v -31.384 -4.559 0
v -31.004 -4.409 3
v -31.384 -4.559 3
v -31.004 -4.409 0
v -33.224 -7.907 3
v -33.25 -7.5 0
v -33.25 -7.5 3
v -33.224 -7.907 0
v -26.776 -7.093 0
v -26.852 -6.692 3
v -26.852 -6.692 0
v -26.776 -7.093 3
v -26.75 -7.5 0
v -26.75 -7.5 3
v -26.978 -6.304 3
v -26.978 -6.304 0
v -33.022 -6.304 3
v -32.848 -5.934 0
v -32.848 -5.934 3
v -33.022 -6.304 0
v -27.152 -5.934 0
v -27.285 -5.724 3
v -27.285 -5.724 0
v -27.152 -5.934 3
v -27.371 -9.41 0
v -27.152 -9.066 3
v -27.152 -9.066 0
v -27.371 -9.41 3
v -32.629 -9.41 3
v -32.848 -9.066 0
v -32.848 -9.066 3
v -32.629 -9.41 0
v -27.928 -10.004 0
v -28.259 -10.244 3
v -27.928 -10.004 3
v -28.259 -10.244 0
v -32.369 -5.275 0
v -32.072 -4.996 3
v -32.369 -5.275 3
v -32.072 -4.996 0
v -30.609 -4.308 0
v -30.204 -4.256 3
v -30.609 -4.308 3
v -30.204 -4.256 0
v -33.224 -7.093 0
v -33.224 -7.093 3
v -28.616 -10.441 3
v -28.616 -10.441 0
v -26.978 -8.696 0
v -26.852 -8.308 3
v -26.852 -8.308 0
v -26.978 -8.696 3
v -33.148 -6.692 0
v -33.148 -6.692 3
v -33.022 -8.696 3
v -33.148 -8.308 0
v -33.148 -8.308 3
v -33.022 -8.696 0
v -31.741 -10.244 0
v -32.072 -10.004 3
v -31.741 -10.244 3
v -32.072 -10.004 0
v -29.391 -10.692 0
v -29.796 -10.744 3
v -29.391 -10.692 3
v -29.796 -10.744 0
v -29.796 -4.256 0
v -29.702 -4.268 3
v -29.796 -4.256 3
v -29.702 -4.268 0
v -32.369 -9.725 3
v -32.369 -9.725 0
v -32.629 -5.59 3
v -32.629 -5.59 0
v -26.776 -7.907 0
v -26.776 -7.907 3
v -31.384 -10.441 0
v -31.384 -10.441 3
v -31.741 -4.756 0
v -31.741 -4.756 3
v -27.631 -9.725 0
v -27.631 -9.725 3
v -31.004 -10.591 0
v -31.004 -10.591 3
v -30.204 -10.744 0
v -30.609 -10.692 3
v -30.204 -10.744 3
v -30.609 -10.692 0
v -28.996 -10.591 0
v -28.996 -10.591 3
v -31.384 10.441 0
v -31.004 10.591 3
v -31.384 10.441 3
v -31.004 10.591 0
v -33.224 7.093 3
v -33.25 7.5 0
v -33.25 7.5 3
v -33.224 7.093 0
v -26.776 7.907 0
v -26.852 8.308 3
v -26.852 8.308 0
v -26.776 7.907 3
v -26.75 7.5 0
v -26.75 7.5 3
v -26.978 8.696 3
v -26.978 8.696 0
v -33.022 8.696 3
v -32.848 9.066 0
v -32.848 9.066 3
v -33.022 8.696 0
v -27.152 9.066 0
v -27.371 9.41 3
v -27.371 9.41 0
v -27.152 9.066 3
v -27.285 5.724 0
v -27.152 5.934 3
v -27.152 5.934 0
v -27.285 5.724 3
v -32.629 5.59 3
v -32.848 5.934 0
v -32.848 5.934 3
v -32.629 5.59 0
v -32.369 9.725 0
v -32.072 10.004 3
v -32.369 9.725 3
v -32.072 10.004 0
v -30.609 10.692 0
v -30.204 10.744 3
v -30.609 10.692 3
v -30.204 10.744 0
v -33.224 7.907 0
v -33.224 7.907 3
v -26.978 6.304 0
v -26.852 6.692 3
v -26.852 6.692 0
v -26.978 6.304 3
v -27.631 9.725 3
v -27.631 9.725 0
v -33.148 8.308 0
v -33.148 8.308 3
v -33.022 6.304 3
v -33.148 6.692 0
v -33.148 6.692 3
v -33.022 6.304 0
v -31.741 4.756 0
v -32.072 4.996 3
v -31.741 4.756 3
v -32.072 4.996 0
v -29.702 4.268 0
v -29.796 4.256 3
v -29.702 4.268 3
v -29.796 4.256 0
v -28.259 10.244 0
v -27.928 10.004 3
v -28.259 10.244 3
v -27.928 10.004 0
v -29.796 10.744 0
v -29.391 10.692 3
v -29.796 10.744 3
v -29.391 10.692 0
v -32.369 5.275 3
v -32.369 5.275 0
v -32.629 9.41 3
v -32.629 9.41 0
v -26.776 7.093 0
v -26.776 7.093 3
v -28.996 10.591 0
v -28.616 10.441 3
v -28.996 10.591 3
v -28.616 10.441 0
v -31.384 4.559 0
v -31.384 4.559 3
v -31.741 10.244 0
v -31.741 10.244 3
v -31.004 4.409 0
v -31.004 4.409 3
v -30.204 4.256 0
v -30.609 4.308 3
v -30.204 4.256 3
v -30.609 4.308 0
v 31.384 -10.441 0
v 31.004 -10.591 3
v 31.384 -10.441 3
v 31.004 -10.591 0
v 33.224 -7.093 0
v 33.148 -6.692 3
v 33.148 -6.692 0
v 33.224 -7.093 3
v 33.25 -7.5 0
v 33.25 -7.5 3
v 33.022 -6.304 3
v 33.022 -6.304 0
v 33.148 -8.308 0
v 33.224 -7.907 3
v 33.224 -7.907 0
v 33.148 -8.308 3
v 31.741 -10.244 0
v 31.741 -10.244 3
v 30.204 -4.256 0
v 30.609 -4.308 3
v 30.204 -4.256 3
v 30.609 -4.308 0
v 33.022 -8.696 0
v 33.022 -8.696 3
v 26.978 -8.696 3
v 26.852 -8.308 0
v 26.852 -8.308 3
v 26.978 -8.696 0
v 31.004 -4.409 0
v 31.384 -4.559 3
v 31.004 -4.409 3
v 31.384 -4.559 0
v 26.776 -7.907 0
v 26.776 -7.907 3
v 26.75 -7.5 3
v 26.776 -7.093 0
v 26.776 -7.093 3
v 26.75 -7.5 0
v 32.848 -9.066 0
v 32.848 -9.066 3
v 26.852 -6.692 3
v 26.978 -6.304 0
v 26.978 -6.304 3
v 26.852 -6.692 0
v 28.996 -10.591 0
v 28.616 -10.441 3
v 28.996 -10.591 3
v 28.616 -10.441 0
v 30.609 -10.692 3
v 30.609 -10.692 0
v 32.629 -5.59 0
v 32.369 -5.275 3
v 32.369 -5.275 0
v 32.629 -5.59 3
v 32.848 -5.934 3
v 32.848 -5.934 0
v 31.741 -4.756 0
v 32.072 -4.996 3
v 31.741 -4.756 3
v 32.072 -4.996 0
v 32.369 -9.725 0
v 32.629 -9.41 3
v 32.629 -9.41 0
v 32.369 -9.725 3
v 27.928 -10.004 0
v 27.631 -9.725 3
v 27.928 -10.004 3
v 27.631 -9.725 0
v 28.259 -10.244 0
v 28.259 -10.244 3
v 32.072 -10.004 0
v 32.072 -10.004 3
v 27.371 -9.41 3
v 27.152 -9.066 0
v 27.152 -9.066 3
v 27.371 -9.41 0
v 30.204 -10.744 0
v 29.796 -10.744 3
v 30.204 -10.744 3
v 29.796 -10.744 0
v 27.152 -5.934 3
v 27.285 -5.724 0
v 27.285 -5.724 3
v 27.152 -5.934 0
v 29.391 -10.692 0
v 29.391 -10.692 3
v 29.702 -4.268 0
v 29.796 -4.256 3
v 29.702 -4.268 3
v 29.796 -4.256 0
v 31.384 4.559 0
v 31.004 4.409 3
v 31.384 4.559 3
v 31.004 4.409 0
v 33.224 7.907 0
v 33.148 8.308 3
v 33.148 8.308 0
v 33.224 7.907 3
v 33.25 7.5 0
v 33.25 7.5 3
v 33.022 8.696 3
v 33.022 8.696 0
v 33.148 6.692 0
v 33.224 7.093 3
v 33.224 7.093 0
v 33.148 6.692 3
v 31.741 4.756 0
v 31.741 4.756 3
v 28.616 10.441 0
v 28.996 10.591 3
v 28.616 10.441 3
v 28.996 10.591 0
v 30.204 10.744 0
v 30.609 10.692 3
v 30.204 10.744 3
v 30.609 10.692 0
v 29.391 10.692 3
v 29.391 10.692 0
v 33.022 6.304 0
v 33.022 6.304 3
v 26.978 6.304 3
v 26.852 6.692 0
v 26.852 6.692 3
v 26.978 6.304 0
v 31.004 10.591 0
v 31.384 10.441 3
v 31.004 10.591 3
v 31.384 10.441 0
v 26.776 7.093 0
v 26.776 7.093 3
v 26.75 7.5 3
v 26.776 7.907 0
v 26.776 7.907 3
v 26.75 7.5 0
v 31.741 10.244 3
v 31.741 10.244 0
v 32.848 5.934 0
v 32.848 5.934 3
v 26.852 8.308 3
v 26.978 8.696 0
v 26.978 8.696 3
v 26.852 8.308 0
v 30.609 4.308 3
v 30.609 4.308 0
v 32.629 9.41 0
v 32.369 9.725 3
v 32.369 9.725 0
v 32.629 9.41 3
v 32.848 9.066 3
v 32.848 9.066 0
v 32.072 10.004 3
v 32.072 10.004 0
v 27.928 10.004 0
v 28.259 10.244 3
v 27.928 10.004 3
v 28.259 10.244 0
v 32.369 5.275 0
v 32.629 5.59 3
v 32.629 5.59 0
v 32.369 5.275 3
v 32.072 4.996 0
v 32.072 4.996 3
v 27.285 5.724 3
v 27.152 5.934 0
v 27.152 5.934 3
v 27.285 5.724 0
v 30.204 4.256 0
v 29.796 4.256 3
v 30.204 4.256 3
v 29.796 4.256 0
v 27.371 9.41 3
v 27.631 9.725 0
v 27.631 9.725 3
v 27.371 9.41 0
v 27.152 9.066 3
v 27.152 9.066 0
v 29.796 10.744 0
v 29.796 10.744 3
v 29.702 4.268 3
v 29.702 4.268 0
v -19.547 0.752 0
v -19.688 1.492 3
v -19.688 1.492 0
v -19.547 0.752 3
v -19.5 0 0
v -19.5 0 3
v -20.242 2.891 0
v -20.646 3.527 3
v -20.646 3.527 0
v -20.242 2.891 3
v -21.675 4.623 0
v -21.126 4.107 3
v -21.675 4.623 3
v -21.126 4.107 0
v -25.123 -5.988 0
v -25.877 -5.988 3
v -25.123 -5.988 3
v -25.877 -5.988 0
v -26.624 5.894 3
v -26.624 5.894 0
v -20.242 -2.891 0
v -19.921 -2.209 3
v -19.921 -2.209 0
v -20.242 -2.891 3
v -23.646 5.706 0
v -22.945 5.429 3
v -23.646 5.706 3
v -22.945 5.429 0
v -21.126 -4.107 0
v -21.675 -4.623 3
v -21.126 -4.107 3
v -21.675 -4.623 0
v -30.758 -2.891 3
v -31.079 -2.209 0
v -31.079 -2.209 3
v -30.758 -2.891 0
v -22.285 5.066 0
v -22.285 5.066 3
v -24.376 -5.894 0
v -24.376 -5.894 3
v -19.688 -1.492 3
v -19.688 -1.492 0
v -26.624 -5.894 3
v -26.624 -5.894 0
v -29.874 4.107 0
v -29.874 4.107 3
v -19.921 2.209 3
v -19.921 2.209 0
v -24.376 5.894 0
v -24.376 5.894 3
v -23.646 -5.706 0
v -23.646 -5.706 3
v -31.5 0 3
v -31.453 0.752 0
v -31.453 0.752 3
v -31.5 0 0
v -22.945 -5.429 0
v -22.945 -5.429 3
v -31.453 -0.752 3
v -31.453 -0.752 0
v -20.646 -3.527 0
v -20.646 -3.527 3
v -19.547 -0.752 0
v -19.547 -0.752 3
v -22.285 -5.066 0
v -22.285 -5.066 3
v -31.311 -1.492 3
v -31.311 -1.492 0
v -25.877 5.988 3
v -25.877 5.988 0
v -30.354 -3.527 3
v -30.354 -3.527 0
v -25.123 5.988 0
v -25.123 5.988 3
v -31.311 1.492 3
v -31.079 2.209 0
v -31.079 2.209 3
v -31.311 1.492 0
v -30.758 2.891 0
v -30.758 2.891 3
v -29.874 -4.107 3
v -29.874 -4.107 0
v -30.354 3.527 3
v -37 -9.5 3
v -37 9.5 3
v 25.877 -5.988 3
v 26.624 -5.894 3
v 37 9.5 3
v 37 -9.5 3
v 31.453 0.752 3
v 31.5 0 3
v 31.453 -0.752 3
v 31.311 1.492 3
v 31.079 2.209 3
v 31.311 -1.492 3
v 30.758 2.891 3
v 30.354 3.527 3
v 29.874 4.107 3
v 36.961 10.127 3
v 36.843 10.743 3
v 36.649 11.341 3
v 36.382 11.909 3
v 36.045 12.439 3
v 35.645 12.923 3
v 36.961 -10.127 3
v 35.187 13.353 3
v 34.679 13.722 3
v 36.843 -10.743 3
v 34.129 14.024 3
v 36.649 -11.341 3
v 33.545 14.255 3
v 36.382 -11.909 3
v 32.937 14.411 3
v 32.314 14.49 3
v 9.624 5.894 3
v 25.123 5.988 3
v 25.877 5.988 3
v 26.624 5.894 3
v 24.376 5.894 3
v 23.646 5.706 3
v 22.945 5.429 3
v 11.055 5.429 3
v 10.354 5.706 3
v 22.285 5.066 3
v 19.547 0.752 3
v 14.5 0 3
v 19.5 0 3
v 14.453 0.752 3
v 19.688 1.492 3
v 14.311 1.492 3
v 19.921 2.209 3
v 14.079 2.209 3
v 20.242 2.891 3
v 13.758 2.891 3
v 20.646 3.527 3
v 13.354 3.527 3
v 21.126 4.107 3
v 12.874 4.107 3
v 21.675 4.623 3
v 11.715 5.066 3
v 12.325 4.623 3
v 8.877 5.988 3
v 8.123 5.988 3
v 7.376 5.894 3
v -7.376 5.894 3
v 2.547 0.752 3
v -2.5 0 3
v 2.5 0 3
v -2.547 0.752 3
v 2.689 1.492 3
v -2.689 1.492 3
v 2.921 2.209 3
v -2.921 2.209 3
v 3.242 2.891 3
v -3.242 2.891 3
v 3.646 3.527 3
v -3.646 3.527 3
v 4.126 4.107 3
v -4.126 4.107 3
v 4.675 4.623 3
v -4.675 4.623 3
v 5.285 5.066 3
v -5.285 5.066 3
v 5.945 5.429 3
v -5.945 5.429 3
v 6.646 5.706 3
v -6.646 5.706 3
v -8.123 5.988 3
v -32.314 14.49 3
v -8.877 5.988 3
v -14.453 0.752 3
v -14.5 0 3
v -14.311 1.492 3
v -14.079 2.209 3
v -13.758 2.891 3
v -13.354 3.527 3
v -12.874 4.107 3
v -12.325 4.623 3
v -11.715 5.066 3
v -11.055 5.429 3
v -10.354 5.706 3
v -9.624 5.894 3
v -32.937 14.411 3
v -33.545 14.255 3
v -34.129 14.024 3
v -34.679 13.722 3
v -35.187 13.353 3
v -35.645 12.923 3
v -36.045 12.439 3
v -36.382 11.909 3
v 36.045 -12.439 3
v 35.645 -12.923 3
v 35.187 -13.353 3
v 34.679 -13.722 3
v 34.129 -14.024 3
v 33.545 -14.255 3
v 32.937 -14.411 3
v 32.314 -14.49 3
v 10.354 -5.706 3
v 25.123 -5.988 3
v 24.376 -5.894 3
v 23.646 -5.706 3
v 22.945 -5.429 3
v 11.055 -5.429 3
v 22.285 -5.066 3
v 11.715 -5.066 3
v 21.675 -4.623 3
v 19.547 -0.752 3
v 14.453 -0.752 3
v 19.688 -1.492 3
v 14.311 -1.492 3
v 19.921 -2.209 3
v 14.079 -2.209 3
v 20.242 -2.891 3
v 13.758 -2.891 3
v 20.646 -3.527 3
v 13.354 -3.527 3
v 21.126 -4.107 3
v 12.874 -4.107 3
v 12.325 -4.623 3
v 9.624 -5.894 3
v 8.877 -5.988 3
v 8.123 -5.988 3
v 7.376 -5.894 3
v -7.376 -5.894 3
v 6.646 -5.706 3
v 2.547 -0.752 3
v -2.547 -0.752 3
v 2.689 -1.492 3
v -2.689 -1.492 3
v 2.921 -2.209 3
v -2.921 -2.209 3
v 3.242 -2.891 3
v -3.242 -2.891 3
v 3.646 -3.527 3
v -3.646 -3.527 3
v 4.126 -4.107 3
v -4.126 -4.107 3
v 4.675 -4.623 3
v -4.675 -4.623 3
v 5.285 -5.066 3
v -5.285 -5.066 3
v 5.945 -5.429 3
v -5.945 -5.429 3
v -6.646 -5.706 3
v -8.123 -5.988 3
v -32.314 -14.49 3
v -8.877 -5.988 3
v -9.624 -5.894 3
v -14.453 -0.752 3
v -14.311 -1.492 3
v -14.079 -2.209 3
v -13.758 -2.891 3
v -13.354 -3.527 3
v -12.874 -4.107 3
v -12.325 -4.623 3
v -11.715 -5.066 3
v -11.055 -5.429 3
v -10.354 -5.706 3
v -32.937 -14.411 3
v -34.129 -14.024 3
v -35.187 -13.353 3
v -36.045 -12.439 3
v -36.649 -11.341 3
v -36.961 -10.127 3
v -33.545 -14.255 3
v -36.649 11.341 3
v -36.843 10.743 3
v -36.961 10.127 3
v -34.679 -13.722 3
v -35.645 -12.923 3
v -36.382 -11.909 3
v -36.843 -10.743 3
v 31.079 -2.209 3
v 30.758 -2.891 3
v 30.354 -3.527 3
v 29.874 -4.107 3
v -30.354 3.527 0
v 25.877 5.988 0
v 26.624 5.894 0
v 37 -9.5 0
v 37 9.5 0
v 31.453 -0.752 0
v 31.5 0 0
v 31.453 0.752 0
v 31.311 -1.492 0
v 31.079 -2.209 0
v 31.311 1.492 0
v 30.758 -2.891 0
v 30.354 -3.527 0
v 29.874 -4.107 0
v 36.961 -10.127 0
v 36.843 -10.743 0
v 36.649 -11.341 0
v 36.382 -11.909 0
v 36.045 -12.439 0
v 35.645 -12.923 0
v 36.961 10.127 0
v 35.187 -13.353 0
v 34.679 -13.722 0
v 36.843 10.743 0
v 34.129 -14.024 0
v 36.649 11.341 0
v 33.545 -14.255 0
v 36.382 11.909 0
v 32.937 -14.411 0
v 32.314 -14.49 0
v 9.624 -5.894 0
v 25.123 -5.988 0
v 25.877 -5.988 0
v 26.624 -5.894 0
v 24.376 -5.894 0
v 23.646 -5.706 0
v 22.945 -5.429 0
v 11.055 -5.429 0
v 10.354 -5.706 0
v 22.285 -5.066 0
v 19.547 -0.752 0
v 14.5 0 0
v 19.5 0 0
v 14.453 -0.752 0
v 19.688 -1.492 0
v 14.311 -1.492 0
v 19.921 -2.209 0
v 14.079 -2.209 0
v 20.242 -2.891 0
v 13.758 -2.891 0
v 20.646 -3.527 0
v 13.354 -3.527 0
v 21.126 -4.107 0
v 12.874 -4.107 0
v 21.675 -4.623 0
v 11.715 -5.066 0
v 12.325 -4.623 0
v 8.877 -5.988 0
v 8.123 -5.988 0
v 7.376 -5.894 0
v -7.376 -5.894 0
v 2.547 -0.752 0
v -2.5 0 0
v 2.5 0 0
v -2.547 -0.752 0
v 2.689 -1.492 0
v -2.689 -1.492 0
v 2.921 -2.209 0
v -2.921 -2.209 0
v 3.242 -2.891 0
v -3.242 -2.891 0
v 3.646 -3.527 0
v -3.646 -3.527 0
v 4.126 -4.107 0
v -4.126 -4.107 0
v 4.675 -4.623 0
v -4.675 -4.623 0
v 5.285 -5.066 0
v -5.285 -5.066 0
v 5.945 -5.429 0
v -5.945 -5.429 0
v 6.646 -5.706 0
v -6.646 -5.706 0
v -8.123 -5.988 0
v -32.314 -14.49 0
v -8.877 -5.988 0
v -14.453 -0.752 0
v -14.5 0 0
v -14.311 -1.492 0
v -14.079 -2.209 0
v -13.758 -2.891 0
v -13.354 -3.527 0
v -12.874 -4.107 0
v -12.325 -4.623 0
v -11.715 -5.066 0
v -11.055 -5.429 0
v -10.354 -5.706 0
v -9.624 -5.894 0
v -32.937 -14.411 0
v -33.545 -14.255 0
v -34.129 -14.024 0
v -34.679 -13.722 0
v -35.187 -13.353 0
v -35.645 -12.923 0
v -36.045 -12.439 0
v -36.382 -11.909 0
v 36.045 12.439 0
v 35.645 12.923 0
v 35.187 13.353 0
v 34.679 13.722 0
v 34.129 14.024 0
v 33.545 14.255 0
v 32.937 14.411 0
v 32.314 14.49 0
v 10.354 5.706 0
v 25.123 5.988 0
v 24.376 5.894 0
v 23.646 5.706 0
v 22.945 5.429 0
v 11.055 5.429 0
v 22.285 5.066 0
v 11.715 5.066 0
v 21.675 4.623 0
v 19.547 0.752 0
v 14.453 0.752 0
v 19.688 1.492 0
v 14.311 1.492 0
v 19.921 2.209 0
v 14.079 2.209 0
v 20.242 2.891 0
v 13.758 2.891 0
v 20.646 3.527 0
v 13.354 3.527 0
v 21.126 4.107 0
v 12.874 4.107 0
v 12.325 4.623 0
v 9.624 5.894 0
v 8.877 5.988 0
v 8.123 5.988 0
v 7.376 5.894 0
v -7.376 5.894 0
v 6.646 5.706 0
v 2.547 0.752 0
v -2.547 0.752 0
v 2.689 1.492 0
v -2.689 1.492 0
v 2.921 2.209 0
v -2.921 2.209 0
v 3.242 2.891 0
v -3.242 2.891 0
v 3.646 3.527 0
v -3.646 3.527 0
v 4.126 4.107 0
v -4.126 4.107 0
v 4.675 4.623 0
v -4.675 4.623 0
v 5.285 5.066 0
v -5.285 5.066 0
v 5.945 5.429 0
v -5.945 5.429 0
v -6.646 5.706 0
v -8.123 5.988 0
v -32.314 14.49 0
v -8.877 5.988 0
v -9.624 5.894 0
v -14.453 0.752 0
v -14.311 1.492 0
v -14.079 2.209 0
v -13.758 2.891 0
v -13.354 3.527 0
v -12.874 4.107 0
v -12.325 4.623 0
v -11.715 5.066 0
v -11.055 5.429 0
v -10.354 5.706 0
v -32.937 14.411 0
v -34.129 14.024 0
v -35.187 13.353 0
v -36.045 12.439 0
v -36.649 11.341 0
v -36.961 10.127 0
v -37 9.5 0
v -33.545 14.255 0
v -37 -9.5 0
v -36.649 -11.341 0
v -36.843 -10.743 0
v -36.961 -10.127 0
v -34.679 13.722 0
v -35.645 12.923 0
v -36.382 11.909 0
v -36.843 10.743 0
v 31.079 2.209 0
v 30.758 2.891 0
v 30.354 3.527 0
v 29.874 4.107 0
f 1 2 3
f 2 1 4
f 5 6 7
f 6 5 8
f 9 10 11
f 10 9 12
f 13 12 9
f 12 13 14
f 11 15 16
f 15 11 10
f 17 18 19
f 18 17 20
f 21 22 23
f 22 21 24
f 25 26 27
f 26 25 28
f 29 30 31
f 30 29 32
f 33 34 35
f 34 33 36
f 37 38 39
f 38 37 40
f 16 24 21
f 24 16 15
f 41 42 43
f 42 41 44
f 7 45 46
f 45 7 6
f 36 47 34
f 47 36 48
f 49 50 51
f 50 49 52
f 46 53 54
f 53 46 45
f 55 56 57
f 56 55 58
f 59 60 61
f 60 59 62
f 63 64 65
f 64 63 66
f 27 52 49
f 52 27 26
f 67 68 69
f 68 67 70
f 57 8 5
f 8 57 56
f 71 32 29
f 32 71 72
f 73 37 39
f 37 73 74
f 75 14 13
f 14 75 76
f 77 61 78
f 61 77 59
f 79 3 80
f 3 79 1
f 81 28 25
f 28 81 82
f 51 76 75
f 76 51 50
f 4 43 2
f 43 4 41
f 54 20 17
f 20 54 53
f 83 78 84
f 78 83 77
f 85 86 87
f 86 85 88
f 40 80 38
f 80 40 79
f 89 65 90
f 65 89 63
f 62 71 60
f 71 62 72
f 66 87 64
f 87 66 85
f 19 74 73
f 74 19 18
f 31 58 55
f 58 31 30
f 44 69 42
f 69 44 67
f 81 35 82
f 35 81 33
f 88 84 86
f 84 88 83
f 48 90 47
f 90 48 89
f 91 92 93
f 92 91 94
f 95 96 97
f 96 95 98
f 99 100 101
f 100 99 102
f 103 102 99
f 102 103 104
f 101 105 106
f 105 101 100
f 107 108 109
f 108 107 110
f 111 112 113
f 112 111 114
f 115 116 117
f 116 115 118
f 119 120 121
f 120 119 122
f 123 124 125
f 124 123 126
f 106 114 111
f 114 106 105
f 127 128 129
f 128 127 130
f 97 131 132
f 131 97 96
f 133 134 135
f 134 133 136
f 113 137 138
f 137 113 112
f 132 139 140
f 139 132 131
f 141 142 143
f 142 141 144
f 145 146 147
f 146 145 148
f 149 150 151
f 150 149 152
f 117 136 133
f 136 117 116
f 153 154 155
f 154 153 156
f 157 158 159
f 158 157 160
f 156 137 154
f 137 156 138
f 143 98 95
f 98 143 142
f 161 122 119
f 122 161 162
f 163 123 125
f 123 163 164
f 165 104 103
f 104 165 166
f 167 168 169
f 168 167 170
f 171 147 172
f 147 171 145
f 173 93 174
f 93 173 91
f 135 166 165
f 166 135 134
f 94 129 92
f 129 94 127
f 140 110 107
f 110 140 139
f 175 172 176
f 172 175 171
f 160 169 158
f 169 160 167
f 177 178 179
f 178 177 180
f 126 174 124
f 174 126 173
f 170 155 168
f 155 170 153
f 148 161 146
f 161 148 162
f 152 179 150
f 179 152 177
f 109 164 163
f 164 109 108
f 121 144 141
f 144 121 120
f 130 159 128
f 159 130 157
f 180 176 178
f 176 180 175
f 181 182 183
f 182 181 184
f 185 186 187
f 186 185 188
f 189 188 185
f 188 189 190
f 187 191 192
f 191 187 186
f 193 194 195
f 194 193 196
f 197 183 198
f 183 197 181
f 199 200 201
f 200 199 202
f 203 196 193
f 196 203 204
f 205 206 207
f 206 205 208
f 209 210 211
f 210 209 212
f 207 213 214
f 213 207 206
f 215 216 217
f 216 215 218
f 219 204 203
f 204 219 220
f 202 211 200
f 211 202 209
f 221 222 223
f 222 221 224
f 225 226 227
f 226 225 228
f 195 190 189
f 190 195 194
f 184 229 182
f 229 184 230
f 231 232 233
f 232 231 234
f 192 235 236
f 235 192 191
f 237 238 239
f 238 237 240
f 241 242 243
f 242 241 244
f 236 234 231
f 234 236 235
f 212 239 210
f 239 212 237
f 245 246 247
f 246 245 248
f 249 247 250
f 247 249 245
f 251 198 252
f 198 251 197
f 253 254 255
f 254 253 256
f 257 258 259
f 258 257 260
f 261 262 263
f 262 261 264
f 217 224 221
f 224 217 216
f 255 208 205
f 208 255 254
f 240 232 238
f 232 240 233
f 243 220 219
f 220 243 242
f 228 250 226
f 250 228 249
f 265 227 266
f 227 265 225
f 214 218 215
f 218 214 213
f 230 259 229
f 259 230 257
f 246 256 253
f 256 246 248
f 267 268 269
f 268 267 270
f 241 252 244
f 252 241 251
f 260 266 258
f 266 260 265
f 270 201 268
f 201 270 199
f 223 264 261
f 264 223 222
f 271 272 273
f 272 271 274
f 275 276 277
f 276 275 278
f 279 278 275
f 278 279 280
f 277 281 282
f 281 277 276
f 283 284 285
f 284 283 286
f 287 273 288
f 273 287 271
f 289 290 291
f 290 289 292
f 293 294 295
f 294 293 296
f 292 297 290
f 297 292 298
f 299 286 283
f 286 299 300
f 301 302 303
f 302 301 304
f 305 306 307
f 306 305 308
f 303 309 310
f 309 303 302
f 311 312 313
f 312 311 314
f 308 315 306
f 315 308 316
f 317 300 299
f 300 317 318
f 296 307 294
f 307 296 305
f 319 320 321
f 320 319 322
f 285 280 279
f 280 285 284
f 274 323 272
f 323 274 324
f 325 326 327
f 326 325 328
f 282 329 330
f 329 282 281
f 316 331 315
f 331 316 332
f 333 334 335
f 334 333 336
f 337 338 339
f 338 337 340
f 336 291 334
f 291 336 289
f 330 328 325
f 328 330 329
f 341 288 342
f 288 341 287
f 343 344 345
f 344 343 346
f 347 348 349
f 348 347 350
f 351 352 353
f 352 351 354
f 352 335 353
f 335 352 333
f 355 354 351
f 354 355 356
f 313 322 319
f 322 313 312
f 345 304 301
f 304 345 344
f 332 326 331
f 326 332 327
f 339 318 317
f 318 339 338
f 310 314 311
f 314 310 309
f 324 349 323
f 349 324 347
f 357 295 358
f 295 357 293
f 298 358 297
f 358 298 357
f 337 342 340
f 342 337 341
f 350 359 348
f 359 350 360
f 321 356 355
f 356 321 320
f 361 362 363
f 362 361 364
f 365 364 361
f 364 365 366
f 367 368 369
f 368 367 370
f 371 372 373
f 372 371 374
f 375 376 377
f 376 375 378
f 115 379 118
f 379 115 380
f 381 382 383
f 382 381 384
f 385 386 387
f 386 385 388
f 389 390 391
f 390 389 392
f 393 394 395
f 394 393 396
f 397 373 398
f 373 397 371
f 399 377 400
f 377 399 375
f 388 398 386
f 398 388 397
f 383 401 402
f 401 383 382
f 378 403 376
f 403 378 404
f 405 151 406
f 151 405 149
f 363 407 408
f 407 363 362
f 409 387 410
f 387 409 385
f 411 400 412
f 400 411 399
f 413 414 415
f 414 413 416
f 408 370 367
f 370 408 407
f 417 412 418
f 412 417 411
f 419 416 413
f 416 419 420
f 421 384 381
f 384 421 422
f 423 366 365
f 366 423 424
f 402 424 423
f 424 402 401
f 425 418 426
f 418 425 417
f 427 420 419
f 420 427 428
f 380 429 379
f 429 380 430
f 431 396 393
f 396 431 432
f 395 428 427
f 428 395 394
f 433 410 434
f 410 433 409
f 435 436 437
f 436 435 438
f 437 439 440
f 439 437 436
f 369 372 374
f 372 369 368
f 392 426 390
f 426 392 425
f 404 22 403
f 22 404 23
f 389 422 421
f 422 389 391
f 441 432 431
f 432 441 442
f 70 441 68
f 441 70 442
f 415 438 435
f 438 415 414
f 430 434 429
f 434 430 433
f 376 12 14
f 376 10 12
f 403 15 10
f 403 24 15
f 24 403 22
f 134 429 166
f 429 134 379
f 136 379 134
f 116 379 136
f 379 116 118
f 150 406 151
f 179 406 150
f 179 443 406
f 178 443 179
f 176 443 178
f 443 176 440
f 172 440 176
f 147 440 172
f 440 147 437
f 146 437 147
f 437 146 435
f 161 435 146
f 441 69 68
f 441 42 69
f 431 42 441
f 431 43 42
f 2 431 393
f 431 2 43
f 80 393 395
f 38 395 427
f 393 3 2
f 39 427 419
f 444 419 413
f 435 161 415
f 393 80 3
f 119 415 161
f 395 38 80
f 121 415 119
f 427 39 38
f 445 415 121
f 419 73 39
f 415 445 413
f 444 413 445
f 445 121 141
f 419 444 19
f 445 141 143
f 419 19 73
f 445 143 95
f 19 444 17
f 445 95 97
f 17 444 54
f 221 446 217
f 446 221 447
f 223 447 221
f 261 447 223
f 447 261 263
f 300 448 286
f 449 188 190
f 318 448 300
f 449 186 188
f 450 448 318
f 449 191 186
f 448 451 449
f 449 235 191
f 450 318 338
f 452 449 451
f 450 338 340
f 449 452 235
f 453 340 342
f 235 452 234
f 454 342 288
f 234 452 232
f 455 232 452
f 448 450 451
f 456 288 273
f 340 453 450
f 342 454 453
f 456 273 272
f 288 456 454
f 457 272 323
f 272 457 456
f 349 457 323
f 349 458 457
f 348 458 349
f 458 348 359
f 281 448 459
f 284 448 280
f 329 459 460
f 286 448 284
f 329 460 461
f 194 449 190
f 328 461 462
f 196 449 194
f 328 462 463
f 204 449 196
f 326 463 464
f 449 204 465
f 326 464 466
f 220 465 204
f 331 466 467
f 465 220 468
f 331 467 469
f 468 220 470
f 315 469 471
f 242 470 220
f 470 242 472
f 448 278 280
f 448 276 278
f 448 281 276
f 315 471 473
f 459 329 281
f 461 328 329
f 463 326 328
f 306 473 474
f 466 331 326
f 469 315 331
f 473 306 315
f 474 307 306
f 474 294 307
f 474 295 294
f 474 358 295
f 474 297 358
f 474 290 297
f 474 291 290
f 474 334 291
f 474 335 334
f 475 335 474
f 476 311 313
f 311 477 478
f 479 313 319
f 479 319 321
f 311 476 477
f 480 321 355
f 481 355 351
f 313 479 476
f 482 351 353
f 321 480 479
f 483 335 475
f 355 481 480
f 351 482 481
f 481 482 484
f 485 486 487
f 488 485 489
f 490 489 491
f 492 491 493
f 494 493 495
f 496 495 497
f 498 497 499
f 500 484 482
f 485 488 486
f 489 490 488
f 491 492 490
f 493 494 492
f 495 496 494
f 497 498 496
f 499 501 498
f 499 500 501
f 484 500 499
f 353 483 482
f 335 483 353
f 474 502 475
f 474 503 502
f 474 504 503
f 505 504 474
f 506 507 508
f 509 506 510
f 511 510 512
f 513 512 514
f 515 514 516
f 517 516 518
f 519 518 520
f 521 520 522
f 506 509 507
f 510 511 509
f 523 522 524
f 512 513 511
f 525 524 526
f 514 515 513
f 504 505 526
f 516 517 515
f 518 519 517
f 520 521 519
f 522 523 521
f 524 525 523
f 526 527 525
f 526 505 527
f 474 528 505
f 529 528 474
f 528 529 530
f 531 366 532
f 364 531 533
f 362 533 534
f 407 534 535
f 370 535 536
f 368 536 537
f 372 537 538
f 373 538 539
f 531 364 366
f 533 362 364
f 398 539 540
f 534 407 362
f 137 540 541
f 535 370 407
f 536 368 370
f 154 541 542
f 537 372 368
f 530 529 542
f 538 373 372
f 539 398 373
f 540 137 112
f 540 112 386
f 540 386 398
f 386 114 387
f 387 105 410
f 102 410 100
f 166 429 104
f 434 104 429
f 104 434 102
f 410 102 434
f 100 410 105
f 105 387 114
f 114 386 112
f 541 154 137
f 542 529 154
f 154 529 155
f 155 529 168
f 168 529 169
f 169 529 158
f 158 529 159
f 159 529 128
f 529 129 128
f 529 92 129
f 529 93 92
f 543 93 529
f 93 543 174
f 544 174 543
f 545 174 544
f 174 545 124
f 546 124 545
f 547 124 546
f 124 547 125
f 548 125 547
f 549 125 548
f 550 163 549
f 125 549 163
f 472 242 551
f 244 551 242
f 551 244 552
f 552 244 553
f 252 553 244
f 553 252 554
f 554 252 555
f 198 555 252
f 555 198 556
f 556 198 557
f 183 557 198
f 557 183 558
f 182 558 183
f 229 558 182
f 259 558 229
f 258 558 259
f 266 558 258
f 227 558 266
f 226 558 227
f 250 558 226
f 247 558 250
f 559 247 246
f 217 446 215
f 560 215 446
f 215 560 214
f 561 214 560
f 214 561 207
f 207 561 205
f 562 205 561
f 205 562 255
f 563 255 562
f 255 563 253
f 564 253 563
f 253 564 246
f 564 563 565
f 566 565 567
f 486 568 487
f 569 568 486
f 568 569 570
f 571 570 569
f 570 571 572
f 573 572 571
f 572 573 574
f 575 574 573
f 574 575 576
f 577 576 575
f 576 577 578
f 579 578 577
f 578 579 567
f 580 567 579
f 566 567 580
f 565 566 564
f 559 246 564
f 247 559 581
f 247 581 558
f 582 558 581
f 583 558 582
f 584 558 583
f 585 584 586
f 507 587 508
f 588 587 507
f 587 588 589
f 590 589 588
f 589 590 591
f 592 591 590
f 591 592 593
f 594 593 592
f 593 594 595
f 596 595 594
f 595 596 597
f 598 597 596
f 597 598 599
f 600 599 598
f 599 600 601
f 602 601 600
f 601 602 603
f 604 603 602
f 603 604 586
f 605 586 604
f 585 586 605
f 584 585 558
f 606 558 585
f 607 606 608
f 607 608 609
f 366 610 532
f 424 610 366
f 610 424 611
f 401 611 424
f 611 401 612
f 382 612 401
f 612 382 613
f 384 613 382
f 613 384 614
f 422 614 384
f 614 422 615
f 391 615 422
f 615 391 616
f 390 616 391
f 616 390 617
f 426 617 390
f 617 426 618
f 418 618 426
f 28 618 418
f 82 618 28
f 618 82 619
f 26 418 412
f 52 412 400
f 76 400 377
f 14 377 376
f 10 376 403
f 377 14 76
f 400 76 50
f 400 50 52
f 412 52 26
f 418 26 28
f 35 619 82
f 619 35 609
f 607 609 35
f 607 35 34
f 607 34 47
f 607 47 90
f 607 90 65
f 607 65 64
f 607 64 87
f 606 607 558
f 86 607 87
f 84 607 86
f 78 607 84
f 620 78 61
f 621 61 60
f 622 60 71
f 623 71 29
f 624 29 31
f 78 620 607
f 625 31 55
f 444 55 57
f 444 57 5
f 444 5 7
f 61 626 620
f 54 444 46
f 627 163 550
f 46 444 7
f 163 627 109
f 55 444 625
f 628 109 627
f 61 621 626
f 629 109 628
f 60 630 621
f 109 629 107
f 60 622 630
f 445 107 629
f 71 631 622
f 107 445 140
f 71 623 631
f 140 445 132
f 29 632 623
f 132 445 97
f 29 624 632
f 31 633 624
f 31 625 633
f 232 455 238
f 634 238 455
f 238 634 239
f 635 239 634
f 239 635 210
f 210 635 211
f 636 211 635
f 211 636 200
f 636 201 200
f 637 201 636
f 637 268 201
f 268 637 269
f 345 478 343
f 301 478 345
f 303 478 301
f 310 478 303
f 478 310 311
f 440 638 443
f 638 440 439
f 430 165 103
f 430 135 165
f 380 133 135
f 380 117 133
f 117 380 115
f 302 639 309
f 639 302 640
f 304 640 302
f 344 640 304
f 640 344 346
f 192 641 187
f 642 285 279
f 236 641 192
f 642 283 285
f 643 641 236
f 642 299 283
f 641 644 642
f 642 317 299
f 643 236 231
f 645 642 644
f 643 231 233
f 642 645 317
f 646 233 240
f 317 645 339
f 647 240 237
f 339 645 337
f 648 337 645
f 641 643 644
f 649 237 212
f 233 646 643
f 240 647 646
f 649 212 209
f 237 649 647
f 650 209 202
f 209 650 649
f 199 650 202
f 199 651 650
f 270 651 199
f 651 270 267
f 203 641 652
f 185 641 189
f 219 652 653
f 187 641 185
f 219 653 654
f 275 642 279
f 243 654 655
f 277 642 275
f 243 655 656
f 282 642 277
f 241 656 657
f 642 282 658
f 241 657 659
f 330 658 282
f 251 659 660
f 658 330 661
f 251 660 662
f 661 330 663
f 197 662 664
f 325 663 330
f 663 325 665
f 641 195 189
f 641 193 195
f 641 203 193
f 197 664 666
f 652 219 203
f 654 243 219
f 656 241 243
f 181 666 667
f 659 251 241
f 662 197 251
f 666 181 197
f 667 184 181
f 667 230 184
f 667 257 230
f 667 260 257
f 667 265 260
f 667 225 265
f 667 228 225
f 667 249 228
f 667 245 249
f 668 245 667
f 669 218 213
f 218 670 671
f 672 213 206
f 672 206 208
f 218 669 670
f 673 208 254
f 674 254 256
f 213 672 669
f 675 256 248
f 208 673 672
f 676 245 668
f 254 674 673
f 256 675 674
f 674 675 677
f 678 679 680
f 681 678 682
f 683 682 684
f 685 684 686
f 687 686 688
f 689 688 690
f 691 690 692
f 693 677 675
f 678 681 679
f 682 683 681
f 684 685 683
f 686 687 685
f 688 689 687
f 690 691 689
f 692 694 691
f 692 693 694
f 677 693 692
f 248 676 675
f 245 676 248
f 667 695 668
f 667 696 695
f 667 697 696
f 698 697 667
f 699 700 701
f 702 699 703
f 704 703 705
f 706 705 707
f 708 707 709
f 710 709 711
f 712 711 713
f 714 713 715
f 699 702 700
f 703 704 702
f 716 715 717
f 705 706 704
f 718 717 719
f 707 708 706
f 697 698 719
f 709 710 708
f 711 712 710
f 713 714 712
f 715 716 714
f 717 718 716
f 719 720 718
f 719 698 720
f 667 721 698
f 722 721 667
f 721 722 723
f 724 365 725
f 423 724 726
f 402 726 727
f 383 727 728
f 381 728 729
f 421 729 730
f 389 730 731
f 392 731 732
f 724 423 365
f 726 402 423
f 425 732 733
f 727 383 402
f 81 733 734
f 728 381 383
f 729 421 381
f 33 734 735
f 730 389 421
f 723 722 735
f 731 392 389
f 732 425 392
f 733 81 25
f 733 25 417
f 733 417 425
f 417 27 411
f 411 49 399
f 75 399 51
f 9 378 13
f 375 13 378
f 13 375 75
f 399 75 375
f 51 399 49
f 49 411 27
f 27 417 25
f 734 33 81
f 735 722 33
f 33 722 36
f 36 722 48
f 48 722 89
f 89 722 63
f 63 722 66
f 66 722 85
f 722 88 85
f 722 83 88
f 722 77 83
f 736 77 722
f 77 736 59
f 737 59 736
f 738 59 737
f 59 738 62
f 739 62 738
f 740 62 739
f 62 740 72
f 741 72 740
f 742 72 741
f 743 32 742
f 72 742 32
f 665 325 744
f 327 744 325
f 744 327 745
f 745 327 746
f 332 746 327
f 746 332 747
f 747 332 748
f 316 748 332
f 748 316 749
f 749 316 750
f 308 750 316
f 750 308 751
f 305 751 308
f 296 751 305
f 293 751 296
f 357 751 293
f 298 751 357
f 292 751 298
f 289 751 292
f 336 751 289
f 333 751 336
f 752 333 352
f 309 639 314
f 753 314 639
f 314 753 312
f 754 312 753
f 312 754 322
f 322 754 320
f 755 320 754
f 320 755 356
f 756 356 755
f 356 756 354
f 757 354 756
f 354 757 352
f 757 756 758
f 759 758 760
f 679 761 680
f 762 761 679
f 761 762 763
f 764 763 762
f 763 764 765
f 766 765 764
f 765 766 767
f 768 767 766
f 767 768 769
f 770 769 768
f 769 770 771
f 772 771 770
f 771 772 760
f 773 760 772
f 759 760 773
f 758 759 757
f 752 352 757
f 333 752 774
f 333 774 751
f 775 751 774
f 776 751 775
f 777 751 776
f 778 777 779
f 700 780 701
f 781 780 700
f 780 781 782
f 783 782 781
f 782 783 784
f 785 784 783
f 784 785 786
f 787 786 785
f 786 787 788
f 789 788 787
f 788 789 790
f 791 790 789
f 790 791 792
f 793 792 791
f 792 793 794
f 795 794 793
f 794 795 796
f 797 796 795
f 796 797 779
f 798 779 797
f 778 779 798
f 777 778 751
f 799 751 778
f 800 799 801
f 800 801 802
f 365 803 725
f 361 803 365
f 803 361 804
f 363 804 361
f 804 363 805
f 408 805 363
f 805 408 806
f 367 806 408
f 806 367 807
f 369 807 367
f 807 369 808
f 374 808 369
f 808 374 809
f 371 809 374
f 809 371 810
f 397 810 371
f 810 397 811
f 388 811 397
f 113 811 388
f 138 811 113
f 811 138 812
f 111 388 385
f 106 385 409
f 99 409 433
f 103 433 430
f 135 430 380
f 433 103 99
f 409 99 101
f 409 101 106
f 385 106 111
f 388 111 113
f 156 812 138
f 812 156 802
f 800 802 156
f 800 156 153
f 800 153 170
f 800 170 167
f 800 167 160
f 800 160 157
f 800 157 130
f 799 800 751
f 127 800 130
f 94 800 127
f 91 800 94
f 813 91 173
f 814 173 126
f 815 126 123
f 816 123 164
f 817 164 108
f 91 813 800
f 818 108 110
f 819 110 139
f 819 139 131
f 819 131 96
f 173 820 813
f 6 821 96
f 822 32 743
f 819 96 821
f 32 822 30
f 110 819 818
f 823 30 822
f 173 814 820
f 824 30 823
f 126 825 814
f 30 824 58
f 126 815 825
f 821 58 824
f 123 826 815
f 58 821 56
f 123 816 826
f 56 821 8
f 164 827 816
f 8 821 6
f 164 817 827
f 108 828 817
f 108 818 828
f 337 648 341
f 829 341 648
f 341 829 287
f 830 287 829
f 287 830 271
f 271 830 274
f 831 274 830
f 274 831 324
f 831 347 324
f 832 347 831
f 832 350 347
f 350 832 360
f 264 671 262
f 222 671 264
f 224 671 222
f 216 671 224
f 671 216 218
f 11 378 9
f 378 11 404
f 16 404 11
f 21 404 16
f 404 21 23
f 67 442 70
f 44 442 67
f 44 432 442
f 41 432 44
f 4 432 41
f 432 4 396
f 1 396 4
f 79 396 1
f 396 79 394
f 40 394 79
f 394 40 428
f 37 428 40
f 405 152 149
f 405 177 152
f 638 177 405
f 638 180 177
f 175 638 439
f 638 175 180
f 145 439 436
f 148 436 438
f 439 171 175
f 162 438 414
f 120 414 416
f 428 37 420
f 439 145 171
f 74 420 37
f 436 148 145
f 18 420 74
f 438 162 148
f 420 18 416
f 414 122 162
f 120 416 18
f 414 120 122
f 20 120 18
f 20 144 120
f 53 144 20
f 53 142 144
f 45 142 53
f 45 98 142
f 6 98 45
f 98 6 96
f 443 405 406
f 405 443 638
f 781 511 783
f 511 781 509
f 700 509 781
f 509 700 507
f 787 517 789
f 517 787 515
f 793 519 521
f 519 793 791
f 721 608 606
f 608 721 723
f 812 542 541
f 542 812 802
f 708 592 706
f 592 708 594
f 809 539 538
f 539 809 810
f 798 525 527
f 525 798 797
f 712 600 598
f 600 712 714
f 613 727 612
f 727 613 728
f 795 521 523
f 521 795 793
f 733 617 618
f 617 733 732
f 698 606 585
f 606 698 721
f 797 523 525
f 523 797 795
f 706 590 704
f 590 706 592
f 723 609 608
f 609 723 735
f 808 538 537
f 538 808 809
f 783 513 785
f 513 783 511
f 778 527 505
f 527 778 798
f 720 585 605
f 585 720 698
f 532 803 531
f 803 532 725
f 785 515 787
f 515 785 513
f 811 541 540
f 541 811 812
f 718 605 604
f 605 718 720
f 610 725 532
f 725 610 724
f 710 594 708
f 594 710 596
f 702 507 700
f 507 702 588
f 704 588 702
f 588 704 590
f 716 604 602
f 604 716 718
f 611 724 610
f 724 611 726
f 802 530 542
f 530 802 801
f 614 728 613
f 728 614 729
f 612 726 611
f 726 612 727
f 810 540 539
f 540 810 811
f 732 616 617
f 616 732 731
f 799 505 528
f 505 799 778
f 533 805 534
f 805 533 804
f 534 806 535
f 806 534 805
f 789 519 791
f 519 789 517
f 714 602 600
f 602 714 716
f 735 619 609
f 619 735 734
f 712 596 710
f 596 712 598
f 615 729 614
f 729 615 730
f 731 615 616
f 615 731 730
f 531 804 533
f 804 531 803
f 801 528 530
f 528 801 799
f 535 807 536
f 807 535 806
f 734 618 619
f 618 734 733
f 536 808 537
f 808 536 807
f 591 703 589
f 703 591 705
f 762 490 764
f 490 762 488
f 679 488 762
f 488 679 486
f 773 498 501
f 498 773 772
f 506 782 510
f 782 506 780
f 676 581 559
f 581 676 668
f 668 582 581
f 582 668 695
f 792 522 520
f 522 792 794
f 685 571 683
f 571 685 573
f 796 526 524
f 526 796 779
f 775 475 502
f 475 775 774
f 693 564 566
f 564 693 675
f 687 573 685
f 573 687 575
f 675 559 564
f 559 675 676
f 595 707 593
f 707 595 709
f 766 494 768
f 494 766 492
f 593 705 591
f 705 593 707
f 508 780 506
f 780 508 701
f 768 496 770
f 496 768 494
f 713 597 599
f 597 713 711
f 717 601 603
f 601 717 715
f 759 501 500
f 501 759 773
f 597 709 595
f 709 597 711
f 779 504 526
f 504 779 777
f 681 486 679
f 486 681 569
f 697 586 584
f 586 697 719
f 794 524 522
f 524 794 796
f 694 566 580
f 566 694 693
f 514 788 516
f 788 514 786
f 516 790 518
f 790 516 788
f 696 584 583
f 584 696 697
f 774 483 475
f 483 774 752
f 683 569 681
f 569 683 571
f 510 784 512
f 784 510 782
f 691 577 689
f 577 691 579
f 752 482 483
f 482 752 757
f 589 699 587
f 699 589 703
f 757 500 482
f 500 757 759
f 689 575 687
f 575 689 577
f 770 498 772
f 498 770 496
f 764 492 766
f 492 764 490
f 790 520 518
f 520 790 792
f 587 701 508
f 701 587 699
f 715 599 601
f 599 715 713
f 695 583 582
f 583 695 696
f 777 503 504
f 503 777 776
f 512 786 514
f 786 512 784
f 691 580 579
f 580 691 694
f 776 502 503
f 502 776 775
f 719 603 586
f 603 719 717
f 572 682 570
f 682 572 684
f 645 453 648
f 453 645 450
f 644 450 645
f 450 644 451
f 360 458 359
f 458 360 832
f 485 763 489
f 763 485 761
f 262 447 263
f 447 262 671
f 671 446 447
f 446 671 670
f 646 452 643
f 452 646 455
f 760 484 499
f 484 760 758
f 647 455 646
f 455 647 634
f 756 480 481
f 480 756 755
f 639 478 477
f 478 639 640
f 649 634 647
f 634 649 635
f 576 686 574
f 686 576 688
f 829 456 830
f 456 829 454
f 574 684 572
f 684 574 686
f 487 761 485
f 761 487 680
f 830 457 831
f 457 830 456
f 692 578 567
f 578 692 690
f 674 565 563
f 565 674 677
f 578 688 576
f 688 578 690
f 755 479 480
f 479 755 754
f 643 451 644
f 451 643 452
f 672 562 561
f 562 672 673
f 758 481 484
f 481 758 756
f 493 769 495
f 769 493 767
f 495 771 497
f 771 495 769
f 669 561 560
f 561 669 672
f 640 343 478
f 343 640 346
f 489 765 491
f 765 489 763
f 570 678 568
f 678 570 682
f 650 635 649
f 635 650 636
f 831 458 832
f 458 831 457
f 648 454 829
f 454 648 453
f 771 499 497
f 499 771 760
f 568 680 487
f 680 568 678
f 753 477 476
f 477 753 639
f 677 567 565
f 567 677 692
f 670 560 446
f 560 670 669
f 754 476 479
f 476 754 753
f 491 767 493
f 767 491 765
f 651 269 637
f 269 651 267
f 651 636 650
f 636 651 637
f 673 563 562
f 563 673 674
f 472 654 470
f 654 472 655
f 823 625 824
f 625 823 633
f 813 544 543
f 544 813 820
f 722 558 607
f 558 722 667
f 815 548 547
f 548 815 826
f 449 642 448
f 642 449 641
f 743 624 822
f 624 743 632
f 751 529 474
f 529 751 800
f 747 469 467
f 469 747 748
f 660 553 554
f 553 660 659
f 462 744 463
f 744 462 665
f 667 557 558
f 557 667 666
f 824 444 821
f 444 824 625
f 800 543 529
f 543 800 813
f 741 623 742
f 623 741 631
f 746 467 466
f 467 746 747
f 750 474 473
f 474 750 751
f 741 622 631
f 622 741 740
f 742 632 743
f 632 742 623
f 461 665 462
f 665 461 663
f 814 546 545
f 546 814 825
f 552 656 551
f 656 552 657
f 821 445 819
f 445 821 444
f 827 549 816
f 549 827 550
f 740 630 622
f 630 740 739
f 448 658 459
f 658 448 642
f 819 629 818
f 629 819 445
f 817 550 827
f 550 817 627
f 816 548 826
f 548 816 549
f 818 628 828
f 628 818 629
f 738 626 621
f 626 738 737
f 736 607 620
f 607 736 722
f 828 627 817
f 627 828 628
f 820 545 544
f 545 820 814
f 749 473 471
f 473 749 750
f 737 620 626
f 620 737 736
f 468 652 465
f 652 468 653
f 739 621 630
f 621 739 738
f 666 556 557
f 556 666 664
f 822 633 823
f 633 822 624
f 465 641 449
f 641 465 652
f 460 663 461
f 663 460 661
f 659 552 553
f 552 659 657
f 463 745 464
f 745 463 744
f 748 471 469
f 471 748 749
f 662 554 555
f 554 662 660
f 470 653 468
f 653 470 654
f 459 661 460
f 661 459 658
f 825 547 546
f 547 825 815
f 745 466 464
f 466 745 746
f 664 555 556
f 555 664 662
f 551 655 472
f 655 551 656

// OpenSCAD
$fn = 50;

difference() {
	union() {
		hull() {
			translate(v = [-32.0, 9.5, 0]) {
				cylinder(h = 3, r = 5);
			}
			translate(v = [32.0, 9.5, 0]) {
				cylinder(h = 3, r = 5);
			}
			translate(v = [-32.0, -9.5, 0]) {
				cylinder(h = 3, r = 5);
			}
			translate(v = [32.0, -9.5, 0]) {
				cylinder(h = 3, r = 5);
			}
		}
	}
	union() {
		translate(v = [-30.0, -7.5, -100.0]) {
			cylinder(h = 200, r = 3.25);
		}
		translate(v = [-30.0, 7.5, -100.0]) {
			cylinder(h = 200, r = 3.25);
		}
		translate(v = [30.0, -7.5, -100.0]) {
			cylinder(h = 200, r = 3.25);
		}
		translate(v = [30.0, 7.5, -100.0]) {
			cylinder(h = 200, r = 3.25);
		}
		translate(v = [-30.0, -7.5, -100.0]) {
			cylinder(h = 200, r = 1.8);
		}
		translate(v = [-30.0, 7.5, -100.0]) {
			cylinder(h = 200, r = 1.8);
		}
		translate(v = [30.0, -7.5, -100.0]) {
			cylinder(h = 200, r = 1.8);
		}
		translate(v = [30.0, 7.5, -100.0]) {
			cylinder(h = 200, r = 1.8);
		}
		translate(v = [-25.5, 0, 0.0]) {
			cylinder(h = 3, r = 6.0);
		}
		translate(v = [-8.5, 0, 0.0]) {
			cylinder(h = 3, r = 6.0);
		}
		translate(v = [8.5, 0, 0.0]) {
			cylinder(h = 3, r = 6.0);
		}
		translate(v = [25.5, 0, 0.0]) {
			cylinder(h = 3, r = 6.0);
		}
	}
}
